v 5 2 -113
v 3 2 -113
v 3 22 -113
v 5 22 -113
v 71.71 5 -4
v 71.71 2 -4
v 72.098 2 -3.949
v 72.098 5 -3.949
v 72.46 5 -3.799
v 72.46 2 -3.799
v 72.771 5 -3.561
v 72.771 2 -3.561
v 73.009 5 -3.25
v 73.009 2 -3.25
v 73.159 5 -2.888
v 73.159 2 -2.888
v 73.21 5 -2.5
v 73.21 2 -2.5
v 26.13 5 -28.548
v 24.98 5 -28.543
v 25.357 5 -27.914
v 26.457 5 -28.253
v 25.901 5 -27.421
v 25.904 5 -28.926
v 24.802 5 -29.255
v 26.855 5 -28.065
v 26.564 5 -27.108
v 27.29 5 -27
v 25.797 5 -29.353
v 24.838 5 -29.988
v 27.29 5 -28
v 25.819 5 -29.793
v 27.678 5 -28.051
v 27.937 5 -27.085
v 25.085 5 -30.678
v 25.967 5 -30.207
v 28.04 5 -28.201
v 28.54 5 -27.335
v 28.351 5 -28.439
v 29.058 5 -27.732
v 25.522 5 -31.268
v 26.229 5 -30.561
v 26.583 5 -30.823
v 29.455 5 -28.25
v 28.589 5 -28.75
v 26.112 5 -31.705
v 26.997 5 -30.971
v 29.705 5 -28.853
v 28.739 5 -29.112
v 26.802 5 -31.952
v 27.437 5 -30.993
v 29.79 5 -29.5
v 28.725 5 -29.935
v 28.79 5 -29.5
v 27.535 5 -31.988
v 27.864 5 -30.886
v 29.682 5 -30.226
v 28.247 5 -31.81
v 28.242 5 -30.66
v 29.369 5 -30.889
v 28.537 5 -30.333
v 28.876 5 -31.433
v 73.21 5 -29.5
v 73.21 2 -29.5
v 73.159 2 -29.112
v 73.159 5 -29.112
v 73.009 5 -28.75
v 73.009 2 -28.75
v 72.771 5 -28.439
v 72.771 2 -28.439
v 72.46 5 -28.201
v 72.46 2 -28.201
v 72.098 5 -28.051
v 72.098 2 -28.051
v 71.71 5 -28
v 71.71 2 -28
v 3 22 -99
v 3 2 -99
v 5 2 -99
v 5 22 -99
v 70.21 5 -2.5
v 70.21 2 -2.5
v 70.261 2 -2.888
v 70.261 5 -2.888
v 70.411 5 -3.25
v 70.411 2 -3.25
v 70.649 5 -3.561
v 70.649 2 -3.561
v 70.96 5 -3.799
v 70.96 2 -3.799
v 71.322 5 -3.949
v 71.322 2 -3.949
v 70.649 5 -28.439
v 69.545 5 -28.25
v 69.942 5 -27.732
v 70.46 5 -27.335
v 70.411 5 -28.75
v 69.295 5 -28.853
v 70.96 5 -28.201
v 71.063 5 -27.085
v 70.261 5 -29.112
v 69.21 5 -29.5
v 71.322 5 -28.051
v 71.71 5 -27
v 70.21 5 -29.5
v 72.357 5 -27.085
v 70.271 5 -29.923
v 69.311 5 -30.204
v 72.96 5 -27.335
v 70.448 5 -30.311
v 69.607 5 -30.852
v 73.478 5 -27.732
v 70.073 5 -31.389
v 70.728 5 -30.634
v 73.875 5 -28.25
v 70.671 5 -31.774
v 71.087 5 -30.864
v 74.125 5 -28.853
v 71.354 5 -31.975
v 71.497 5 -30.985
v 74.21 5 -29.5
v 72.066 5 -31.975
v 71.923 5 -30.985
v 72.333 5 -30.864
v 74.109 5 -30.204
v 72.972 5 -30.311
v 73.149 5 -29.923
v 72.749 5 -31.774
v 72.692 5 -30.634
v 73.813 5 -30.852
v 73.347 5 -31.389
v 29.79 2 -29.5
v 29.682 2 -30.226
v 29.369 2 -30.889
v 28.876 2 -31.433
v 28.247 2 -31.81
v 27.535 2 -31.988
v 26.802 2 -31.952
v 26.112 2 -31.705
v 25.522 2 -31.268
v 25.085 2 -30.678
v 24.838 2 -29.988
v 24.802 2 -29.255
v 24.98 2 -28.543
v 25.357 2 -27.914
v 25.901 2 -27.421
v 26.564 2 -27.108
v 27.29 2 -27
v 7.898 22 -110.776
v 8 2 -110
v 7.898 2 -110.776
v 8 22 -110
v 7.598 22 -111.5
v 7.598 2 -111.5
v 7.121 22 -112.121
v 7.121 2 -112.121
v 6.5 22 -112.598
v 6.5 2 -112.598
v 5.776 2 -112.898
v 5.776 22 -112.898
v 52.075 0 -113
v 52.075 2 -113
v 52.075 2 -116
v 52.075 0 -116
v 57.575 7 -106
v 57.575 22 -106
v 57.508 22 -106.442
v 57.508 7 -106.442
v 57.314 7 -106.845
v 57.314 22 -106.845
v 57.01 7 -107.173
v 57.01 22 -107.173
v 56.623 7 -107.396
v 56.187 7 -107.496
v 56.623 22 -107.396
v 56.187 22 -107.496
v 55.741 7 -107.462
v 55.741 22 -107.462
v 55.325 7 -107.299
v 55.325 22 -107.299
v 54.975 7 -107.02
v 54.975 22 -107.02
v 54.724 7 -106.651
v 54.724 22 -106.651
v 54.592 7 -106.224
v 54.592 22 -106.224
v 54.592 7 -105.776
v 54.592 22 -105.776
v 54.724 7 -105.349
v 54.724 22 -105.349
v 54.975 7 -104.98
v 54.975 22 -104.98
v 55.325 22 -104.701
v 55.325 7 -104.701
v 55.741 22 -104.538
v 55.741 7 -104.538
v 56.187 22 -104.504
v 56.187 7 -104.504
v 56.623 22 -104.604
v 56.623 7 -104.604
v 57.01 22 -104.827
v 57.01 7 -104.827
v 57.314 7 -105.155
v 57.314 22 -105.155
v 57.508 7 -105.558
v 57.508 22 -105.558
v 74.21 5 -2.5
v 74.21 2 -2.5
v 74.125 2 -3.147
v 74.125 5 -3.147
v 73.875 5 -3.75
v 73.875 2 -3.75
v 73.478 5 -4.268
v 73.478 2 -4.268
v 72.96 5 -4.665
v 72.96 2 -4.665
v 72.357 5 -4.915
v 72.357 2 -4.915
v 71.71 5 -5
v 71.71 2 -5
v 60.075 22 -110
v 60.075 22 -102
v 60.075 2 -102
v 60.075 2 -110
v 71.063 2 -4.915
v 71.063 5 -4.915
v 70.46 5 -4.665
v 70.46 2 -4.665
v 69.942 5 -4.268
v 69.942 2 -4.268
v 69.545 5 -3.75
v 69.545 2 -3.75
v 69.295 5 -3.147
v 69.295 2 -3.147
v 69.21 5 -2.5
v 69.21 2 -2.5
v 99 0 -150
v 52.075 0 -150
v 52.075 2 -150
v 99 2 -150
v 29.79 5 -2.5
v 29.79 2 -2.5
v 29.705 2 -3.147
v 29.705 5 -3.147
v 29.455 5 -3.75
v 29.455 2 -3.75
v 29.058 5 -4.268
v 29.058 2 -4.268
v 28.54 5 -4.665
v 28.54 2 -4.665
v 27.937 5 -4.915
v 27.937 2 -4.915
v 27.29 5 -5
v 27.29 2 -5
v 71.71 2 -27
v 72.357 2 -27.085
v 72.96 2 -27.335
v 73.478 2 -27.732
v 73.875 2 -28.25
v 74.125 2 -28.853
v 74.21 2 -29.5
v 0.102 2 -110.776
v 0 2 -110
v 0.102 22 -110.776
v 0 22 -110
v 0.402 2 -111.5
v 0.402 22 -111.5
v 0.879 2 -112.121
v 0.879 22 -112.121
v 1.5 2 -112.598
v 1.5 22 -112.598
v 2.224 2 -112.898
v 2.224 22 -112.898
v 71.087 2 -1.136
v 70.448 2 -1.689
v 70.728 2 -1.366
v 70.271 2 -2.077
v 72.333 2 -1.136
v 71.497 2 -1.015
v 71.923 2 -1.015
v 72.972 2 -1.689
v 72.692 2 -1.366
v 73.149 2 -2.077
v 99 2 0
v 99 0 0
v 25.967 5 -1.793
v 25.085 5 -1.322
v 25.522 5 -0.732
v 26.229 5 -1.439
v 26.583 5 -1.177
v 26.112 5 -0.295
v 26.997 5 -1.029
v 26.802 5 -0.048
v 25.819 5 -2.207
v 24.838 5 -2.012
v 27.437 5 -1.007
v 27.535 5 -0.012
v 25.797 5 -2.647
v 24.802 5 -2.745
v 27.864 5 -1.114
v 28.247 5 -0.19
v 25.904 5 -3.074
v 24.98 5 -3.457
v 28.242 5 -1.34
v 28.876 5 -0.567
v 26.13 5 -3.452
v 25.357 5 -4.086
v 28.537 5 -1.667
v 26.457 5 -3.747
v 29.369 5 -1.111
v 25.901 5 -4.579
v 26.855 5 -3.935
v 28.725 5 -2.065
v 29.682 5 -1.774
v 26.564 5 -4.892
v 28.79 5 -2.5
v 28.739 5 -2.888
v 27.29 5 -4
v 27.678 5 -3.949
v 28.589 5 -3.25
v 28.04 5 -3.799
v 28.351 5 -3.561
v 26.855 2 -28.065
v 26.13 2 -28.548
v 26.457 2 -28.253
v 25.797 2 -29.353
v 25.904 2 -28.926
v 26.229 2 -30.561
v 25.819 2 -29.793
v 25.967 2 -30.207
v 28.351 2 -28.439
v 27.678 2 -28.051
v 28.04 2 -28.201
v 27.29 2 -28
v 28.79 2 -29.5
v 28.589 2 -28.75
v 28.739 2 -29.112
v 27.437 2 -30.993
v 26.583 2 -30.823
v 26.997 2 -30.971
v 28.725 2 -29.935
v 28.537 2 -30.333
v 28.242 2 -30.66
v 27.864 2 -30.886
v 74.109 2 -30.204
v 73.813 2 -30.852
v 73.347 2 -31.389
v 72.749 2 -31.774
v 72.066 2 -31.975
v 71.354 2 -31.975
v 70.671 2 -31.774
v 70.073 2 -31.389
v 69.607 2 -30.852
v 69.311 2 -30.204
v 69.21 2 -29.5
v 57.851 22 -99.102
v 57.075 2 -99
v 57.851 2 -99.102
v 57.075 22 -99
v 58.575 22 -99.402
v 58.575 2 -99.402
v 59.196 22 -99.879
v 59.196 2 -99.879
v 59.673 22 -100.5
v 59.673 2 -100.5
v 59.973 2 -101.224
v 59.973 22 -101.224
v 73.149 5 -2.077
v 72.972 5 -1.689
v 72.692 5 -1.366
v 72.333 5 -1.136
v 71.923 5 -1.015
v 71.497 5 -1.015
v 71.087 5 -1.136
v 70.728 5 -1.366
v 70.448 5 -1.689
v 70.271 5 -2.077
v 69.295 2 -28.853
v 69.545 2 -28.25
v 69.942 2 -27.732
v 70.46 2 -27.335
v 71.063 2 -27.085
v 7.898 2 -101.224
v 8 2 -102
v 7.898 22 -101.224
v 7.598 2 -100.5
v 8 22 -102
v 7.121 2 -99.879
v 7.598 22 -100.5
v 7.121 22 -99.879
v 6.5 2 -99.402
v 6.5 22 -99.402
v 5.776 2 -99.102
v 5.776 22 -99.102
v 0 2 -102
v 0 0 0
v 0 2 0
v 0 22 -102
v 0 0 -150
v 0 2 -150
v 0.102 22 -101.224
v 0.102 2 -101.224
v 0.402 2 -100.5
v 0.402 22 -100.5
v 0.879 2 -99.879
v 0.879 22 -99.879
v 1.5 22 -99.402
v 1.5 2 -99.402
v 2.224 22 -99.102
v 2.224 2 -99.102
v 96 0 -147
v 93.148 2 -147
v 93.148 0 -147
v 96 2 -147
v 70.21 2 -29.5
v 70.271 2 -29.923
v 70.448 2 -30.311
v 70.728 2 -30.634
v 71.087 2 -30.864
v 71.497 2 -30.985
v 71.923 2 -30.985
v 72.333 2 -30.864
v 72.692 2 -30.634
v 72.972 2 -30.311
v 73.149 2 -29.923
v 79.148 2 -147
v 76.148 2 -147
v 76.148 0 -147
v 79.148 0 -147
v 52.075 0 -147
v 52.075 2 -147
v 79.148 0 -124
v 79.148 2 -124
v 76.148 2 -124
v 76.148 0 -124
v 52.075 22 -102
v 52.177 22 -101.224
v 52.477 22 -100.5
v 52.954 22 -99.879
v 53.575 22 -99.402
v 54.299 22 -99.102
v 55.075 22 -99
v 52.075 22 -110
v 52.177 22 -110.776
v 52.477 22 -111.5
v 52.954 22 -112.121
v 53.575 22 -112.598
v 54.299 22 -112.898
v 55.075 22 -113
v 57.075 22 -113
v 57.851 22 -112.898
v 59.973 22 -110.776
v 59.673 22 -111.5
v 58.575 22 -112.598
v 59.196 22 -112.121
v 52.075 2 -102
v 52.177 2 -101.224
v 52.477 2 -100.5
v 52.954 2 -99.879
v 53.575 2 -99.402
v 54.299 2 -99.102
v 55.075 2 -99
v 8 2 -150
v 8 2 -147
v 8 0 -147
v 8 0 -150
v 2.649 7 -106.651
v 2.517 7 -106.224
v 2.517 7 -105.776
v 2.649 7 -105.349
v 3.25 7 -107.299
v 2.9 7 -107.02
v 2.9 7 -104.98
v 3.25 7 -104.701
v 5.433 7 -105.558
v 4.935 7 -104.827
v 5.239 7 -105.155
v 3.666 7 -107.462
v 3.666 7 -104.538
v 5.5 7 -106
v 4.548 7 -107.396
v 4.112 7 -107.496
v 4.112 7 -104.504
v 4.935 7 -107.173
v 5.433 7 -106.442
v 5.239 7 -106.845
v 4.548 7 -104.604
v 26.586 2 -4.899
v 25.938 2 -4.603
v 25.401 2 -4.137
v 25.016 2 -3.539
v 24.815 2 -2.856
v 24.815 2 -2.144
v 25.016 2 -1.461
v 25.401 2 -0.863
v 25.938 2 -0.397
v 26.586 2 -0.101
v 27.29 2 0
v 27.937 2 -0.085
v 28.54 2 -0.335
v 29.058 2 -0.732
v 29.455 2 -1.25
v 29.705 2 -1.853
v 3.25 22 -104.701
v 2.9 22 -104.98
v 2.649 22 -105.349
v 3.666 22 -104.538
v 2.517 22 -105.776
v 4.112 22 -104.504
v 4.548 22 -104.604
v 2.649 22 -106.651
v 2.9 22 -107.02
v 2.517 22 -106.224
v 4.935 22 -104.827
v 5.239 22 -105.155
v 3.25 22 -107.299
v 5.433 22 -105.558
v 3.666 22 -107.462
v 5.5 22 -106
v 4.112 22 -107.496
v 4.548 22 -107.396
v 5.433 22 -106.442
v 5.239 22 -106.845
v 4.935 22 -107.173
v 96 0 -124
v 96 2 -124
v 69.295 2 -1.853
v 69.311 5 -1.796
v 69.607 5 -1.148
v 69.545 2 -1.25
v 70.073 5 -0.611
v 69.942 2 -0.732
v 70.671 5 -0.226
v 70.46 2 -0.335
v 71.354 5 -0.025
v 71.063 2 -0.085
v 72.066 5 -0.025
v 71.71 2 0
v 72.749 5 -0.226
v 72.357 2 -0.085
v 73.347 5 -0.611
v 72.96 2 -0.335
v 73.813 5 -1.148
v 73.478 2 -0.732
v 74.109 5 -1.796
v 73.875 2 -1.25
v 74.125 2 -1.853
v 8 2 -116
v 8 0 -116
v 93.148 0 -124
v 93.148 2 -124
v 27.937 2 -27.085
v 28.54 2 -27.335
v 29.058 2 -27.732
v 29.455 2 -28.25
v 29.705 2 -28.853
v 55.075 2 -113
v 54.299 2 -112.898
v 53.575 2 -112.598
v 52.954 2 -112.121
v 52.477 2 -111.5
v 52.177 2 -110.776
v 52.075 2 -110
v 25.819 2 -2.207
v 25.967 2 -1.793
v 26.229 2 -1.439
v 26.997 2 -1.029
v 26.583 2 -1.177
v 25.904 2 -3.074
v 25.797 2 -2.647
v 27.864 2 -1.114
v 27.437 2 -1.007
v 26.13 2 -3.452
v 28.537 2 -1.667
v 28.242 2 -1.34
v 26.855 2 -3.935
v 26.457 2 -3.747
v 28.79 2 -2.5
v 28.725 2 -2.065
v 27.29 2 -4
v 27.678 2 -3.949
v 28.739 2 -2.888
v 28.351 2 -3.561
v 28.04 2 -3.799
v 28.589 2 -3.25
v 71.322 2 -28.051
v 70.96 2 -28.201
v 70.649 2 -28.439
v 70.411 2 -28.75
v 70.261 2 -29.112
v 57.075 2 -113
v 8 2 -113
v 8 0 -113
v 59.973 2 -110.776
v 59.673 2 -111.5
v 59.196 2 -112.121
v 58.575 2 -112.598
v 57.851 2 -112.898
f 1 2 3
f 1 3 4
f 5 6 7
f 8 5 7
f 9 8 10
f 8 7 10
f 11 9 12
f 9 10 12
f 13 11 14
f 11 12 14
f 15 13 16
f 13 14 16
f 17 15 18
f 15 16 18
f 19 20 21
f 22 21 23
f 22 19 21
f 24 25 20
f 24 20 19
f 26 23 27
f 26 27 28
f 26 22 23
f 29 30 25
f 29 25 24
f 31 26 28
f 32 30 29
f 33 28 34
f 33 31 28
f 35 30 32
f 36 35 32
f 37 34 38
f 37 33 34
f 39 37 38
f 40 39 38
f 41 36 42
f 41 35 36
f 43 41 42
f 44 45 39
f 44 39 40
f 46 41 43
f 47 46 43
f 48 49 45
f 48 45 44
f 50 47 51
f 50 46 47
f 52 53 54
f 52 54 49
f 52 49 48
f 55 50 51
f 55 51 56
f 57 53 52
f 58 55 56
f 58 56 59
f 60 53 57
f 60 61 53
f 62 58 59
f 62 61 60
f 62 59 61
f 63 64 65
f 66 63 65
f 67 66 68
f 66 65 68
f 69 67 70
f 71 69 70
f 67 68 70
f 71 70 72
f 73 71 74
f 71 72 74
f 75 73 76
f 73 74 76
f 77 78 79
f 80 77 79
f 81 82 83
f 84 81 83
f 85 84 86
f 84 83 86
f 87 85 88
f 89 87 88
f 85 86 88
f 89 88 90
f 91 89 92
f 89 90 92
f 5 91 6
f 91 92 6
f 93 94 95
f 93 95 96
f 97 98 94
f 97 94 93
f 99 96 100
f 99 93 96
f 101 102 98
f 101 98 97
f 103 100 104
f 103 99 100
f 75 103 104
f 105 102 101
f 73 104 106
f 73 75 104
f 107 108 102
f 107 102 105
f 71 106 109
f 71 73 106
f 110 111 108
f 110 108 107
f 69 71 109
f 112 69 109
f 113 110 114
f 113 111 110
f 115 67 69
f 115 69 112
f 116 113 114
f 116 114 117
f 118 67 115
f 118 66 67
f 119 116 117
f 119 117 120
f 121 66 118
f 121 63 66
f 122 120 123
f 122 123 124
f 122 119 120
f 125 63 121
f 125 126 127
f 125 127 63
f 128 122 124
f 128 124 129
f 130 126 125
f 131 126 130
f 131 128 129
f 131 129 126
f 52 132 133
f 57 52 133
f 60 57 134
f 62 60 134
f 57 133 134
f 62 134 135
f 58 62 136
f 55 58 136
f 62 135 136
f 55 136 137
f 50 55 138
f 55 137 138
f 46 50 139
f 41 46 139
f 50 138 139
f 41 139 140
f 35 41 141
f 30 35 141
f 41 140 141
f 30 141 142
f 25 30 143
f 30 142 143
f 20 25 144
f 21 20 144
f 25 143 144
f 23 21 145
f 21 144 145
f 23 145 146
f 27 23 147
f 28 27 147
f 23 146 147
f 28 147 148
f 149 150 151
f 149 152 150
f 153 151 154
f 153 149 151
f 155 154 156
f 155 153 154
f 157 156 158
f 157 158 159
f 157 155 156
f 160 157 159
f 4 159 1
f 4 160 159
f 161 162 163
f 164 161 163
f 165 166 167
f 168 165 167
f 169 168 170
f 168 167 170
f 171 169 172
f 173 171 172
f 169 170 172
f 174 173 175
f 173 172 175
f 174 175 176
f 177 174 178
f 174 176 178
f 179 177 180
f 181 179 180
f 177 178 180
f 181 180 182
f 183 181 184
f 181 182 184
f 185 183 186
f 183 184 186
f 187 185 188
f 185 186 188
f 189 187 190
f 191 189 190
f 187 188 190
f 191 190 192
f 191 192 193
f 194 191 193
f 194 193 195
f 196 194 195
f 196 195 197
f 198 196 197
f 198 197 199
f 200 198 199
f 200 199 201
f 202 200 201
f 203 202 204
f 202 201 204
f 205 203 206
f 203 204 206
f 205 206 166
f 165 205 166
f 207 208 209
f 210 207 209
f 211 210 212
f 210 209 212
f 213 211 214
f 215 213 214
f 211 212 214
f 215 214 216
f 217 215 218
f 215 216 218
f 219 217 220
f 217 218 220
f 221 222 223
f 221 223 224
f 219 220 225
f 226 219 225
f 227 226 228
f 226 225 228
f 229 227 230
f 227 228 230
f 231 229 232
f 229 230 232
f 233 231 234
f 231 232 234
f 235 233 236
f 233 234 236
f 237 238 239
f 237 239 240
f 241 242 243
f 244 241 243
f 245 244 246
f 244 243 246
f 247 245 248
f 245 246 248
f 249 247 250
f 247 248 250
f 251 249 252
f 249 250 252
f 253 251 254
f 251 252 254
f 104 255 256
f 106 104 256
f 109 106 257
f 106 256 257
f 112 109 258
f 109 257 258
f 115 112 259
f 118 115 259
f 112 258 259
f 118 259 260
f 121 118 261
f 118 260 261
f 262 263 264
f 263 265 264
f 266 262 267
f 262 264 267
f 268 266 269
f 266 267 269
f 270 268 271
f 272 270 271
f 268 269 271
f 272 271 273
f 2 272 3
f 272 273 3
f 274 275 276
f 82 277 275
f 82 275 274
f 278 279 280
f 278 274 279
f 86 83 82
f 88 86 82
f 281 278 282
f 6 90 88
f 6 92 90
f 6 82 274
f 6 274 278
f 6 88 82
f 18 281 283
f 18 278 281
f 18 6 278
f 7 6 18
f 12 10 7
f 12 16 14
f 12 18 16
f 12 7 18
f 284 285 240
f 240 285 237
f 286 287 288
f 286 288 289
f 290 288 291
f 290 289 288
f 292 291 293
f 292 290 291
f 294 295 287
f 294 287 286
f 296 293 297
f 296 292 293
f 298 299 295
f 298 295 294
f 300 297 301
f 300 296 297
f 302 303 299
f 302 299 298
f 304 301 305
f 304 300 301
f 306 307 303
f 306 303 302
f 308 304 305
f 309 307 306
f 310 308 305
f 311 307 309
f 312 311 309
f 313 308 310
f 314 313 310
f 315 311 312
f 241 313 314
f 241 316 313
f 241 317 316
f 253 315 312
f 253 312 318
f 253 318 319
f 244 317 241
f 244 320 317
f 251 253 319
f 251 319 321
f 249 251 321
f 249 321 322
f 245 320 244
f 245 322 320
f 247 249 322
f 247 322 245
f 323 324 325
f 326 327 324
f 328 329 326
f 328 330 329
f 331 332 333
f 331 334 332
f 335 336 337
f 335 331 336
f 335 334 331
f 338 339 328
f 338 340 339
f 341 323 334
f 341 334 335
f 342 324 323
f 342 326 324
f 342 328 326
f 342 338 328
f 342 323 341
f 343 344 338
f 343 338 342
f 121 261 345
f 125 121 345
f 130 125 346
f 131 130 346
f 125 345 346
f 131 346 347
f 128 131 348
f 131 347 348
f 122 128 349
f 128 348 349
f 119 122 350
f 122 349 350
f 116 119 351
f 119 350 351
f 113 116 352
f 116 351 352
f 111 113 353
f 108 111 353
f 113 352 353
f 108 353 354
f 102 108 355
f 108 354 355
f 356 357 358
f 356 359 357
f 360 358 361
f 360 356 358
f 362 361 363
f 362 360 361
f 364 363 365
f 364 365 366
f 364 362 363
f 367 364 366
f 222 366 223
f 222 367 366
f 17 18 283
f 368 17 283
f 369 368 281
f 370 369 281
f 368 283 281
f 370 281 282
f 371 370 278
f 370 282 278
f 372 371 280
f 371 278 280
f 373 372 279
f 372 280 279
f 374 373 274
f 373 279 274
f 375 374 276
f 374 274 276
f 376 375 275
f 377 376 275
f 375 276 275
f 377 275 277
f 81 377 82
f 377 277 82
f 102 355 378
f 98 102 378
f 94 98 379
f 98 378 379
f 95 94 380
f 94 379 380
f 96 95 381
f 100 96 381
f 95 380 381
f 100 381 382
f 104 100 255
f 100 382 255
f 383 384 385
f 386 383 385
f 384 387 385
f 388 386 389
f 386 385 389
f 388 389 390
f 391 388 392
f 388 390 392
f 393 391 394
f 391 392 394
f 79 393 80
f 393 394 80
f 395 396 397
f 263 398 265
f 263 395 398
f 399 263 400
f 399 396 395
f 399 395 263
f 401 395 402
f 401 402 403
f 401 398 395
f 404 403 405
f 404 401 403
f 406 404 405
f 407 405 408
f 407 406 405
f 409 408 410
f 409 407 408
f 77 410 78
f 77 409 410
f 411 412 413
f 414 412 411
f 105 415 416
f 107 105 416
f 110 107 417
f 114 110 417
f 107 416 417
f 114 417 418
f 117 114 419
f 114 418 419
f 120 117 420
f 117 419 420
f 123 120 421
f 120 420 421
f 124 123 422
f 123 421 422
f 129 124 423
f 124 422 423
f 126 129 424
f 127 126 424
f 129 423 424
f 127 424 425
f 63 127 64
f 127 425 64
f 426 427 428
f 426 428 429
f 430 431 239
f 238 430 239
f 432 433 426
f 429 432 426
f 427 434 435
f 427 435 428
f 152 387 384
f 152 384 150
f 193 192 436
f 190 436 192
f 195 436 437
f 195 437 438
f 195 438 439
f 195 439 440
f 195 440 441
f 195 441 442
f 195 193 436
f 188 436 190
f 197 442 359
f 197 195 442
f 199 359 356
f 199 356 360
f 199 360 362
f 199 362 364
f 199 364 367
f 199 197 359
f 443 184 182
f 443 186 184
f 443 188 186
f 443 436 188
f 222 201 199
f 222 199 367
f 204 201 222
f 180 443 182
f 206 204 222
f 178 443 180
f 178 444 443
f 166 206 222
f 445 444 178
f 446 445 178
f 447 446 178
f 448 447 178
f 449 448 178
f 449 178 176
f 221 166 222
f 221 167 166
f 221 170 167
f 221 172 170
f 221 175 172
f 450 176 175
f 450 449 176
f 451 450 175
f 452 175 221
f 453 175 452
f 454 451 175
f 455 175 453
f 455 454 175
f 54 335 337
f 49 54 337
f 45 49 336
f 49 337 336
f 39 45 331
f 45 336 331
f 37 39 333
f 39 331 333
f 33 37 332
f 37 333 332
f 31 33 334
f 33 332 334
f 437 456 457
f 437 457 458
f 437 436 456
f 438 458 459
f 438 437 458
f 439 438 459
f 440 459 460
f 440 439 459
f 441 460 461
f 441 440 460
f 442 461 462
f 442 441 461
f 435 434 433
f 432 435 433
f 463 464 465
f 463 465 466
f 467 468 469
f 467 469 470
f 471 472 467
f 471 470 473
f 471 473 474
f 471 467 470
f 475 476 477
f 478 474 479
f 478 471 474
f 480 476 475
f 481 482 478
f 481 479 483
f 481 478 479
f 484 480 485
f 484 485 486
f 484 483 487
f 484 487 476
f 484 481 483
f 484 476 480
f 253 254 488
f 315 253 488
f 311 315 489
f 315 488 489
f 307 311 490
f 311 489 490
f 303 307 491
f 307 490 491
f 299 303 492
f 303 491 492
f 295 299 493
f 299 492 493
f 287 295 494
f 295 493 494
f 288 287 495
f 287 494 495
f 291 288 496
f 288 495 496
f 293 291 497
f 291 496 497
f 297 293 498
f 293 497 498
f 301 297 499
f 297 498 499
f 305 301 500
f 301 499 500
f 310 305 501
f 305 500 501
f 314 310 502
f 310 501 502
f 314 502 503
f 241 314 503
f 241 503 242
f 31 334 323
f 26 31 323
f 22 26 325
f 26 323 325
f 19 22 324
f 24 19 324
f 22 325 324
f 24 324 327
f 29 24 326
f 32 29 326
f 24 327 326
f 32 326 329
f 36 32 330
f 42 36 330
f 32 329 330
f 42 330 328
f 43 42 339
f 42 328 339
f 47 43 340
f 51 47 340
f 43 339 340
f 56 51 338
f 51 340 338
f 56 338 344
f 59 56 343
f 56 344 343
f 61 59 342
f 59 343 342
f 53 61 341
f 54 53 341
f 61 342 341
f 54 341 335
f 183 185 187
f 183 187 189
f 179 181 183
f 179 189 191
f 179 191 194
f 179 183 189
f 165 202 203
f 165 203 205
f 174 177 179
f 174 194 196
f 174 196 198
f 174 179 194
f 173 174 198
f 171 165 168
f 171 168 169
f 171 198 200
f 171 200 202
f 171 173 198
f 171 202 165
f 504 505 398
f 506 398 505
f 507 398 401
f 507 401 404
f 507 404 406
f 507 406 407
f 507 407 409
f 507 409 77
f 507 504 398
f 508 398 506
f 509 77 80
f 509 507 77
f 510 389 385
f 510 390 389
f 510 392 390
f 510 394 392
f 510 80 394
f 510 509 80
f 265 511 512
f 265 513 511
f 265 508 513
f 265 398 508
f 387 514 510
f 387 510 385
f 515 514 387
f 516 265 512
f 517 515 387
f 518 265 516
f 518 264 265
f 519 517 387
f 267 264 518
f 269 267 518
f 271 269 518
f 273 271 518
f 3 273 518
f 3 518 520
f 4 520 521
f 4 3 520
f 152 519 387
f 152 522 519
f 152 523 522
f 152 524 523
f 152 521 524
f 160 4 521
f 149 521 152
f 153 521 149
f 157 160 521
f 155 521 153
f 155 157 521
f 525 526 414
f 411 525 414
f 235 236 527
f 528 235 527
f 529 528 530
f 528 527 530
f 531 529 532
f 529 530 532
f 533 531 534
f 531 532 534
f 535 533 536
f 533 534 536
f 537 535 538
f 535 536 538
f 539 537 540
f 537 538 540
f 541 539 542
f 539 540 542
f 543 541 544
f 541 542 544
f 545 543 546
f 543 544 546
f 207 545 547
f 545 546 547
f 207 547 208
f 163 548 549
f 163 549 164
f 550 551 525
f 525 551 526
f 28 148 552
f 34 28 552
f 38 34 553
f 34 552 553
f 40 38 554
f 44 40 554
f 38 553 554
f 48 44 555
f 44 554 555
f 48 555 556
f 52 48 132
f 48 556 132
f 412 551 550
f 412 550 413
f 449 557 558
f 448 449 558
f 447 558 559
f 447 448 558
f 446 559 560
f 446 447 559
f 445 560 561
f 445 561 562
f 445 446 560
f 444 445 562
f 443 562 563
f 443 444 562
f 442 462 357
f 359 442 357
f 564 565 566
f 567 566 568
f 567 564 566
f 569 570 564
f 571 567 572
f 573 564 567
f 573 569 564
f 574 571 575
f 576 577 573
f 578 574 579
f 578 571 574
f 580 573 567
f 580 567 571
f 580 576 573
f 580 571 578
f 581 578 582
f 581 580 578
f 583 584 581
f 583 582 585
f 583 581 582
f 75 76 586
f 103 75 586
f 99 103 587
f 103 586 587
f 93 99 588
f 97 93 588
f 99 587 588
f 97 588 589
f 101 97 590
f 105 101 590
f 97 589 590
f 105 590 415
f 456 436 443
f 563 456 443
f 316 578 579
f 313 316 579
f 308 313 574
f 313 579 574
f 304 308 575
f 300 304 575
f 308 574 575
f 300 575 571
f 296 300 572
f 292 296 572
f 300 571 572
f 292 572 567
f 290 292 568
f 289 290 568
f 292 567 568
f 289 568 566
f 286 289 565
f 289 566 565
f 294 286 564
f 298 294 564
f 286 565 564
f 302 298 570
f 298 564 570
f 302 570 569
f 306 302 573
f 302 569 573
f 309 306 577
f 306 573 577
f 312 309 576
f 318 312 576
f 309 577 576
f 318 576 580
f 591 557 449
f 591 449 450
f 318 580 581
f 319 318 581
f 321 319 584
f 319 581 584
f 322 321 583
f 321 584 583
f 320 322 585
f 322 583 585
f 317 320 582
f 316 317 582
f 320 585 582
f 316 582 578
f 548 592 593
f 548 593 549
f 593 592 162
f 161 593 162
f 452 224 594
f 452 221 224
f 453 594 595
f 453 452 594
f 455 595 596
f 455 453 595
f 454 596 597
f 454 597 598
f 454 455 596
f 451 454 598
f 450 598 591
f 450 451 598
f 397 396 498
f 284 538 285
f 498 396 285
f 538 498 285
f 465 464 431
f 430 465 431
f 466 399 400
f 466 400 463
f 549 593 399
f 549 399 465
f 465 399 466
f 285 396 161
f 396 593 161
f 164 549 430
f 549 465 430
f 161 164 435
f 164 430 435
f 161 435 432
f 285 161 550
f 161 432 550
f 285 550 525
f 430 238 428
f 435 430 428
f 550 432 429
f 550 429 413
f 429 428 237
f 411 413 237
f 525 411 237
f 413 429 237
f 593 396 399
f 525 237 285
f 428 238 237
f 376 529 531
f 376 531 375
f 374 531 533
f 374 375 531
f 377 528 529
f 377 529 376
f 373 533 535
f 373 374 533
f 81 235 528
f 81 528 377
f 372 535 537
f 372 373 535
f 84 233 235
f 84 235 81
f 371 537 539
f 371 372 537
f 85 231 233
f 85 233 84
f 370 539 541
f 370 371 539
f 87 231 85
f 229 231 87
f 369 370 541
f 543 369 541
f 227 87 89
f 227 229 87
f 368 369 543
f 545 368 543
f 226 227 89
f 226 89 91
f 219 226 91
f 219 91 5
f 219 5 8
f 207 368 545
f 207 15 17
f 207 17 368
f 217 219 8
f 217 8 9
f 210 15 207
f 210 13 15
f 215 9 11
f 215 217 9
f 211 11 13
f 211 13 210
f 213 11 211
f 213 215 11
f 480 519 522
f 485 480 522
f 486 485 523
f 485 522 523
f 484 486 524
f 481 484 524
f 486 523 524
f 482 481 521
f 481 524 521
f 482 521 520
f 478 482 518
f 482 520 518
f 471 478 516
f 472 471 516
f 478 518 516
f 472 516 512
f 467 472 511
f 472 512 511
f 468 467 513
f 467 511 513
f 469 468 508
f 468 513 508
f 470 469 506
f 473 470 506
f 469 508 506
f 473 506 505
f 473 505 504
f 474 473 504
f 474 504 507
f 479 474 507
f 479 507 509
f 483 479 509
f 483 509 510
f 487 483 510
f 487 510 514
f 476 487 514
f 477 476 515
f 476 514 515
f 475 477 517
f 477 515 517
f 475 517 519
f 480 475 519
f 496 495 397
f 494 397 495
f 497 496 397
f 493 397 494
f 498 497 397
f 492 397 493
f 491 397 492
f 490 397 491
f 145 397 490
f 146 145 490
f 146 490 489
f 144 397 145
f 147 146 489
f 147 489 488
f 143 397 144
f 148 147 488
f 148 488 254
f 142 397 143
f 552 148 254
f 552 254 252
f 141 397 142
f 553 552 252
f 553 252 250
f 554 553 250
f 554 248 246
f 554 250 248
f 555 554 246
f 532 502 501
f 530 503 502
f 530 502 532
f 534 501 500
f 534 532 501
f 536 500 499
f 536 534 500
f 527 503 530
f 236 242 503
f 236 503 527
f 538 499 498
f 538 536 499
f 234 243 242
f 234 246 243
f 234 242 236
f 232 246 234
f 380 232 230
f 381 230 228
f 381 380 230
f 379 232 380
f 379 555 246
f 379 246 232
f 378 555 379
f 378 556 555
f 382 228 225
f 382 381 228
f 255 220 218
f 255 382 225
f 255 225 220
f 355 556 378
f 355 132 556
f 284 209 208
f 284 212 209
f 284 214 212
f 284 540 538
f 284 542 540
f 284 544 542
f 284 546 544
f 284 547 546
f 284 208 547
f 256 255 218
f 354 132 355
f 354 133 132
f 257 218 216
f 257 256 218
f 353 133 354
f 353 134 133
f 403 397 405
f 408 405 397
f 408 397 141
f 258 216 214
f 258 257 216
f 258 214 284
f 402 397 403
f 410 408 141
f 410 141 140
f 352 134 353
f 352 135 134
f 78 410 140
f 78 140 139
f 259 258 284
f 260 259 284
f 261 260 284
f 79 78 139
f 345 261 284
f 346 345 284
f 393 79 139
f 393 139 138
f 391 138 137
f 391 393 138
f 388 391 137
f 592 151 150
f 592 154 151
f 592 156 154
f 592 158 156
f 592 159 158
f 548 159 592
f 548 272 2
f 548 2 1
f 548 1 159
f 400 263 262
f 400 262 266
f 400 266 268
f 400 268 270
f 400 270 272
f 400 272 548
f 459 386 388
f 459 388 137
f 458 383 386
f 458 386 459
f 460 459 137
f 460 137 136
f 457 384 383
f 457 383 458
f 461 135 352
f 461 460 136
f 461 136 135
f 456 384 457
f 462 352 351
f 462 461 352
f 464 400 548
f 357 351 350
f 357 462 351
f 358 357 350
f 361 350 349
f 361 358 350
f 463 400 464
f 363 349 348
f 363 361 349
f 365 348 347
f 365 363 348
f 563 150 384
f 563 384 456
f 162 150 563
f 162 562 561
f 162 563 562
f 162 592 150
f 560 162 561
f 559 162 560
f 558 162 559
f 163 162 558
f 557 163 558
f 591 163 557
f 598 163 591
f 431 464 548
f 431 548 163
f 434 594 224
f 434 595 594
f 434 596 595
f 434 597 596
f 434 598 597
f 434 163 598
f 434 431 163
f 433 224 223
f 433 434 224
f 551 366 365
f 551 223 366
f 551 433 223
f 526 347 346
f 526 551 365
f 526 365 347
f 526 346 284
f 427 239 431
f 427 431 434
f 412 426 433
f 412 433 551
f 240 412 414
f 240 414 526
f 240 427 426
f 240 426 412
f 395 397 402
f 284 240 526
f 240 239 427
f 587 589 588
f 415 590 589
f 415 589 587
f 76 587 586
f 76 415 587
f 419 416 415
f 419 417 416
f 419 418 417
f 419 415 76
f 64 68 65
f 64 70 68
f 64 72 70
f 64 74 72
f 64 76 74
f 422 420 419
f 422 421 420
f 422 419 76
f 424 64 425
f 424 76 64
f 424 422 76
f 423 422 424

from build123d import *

# Parameters (mm, degrees)
SKETCH1_W           = 99
SKETCH1_H           = 150
BOSS_EXTRUDE1_DEPTH = 2
SKETCH2_W           = 8
SKETCH2_H           = 14
BOSS_EXTRUDE2_DEPTH = 20
SKETCH3_R           = 1.5
CUT_EXTRUDE2_DEPTH  = 15
FILLET1_R           = 3
FILLET2_R           = 3
FILLET5_R           = 3
FILLET6_R           = 3
FILLET7_R           = 3
FILLET8_R           = 3
FILLET9_R           = 3
FILLET10_R          = 3
SKETCH5_W           = 44.075
SKETCH5_H           = 3
SKETCH5_W_2         = 2.852474079
SKETCH5_H_2         = 23
SKETCH5_W_3         = 3
CUT_EXTRUDE3_DEPTH  = 10
BOSS_EXTRUDE3_DEPTH = 3


with BuildPart() as part:
    # Sketch1 → Boss-Extrude1 (new body)
    with BuildSketch(Plane(origin=(0, 0, 0), x_dir=(1, 0, 0), z_dir=(0, 1, 0))):
        with Locations((49.5, 75)):
            Rectangle(SKETCH1_W, SKETCH1_H)
    extrude(amount=BOSS_EXTRUDE1_DEPTH)

    # Sketch2 → Boss-Extrude2 (add)
    with BuildSketch(Plane(origin=(0, 2, 0), x_dir=(1, 0, 0), z_dir=(0, 1, 0))):
        with Locations((4, 106)):
            Rectangle(SKETCH2_W, SKETCH2_H)
        with Locations((56.075, 106)):
            Rectangle(SKETCH2_W, SKETCH2_H)
    extrude(amount=BOSS_EXTRUDE2_DEPTH)

    # Sketch3 → Cut-Extrude2 (cut)
    with BuildSketch(Plane(origin=(0, 22, 0), x_dir=(1, 0, 0), z_dir=(0, 1, 0))):
        with Locations((56.075, 106)):
            Circle(SKETCH3_R)
        with Locations((4, 106)):
            Circle(SKETCH3_R)
    extrude(amount=-CUT_EXTRUDE2_DEPTH, mode=Mode.SUBTRACT)

    # Fillet1
    fillet1_edges = [part.edges().sort_by_distance(p)[0] for p in [
        (0, 12, -99),
    ]]
    fillet(fillet1_edges, radius=FILLET1_R)

    # Fillet2
    fillet2_edges = [part.edges().sort_by_distance(p)[0] for p in [
        (0, 12, -113),
    ]]
    fillet(fillet2_edges, radius=FILLET2_R)

    # Fillet5
    fillet5_edges = [part.edges().sort_by_distance(p)[0] for p in [
        (8, 12, -113),
    ]]
    fillet(fillet5_edges, radius=FILLET5_R)

    # Fillet6
    fillet6_edges = [part.edges().sort_by_distance(p)[0] for p in [
        (8, 12, -99),
    ]]
    fillet(fillet6_edges, radius=FILLET6_R)

    # Fillet7
    fillet7_edges = [part.edges().sort_by_distance(p)[0] for p in [
        (60.075, 12, -99),
    ]]
    fillet(fillet7_edges, radius=FILLET7_R)

    # Fillet8
    fillet8_edges = [part.edges().sort_by_distance(p)[0] for p in [
        (60.075, 12, -113),
    ]]
    fillet(fillet8_edges, radius=FILLET8_R)

    # Fillet9
    fillet9_edges = [part.edges().sort_by_distance(p)[0] for p in [
        (52.075, 12, -113),
    ]]
    fillet(fillet9_edges, radius=FILLET9_R)

    # Fillet10
    fillet10_edges = [part.edges().sort_by_distance(p)[0] for p in [
        (52.075, 12, -99),
    ]]
    fillet(fillet10_edges, radius=FILLET10_R)

    # Sketch5 → Cut-Extrude3 (cut)
    with BuildSketch(Plane(origin=(0, 2, 0), x_dir=(1, 0, 0), z_dir=(0, 1, 0))):
        with Locations((30.0375, 148.5)):
            Rectangle(SKETCH5_W, SKETCH5_H)
        with Locations((30.0375, 114.5)):
            Rectangle(SKETCH5_W, SKETCH5_H)
        with Locations((94.573762961, 135.5)):
            Rectangle(SKETCH5_W_2, SKETCH5_H_2)
        with Locations((77.647525921, 135.5)):
            Rectangle(SKETCH5_W_3, SKETCH5_H_2)
    extrude(amount=-CUT_EXTRUDE3_DEPTH, mode=Mode.SUBTRACT)

    # Sketch6 → Boss-Extrude3 (add)
    with BuildSketch(Plane(origin=(0, 2, 0), x_dir=(1, 0, 0), z_dir=(0, 1, 0))):
        with BuildLine():
            ThreePointArc((29.79, 29.5), (25.522233047, 31.267766953), (27.29, 27))
            Line((27.29, 27), (27.29, 28))
            ThreePointArc((27.29, 28), (26.229339828, 30.560660172), (28.79, 29.5))
            Line((28.79, 29.5), (29.79, 29.5))
        make_face()
        with BuildLine():
            Line((27.29, 28), (27.29, 27))
            ThreePointArc((27.29, 27), (29.057766953, 27.732233047), (29.79, 29.5))
            Line((29.79, 29.5), (28.79, 29.5))
            ThreePointArc((28.79, 29.5), (28.350660172, 28.439339828), (27.29, 28))
        make_face()
        with BuildLine():
            ThreePointArc((69.21, 29.5), (69.942233047, 27.732233047), (71.71, 27))
            Line((71.71, 27), (71.71, 28))
            ThreePointArc((71.71, 28), (70.649339828, 28.439339828), (70.21, 29.5))
            Line((70.21, 29.5), (69.21, 29.5))
        make_face()
        with BuildLine():
            Line((71.71, 28), (71.71, 27))
            ThreePointArc((71.71, 27), (73.477766953, 27.732233047), (74.21, 29.5))
            ThreePointArc((74.21, 29.5), (71.71, 32), (69.21, 29.5))
            Line((69.21, 29.5), (70.21, 29.5))
            ThreePointArc((70.21, 29.5), (71.71, 31), (73.21, 29.5))
            ThreePointArc((73.21, 29.5), (72.770660172, 28.439339828), (71.71, 28))
        make_face()
        with BuildLine():
            ThreePointArc((27.29, 5), (25.522233047, 0.732233047), (29.79, 2.5))
            Line((29.79, 2.5), (28.79, 2.5))
            ThreePointArc((28.79, 2.5), (26.229339828, 1.439339828), (27.29, 4))
            Line((27.29, 4), (27.29, 5))
        make_face()
        with BuildLine():
            Line((28.79, 2.5), (29.79, 2.5))
            ThreePointArc((29.79, 2.5), (29.057766953, 4.267766953), (27.29, 5))
            Line((27.29, 5), (27.29, 4))
            ThreePointArc((27.29, 4), (28.350660172, 3.560660172), (28.79, 2.5))
        make_face()
        with BuildLine():
            ThreePointArc((71.71, 5), (69.942233047, 4.267766953), (69.21, 2.5))
            Line((69.21, 2.5), (70.21, 2.5))
            ThreePointArc((70.21, 2.5), (70.649339828, 3.560660172), (71.71, 4))
            Line((71.71, 4), (71.71, 5))
        make_face()
        with BuildLine():
            Line((70.21, 2.5), (69.21, 2.5))
            ThreePointArc((69.21, 2.5), (71.71, 0), (74.21, 2.5))
            ThreePointArc((74.21, 2.5), (73.477766953, 4.267766953), (71.71, 5))
            Line((71.71, 5), (71.71, 4))
            ThreePointArc((71.71, 4), (72.770660172, 3.560660172), (73.21, 2.5))
            ThreePointArc((73.21, 2.5), (71.71, 1), (70.21, 2.5))
        make_face()
    extrude(amount=BOSS_EXTRUDE3_DEPTH)


solid = part.part
